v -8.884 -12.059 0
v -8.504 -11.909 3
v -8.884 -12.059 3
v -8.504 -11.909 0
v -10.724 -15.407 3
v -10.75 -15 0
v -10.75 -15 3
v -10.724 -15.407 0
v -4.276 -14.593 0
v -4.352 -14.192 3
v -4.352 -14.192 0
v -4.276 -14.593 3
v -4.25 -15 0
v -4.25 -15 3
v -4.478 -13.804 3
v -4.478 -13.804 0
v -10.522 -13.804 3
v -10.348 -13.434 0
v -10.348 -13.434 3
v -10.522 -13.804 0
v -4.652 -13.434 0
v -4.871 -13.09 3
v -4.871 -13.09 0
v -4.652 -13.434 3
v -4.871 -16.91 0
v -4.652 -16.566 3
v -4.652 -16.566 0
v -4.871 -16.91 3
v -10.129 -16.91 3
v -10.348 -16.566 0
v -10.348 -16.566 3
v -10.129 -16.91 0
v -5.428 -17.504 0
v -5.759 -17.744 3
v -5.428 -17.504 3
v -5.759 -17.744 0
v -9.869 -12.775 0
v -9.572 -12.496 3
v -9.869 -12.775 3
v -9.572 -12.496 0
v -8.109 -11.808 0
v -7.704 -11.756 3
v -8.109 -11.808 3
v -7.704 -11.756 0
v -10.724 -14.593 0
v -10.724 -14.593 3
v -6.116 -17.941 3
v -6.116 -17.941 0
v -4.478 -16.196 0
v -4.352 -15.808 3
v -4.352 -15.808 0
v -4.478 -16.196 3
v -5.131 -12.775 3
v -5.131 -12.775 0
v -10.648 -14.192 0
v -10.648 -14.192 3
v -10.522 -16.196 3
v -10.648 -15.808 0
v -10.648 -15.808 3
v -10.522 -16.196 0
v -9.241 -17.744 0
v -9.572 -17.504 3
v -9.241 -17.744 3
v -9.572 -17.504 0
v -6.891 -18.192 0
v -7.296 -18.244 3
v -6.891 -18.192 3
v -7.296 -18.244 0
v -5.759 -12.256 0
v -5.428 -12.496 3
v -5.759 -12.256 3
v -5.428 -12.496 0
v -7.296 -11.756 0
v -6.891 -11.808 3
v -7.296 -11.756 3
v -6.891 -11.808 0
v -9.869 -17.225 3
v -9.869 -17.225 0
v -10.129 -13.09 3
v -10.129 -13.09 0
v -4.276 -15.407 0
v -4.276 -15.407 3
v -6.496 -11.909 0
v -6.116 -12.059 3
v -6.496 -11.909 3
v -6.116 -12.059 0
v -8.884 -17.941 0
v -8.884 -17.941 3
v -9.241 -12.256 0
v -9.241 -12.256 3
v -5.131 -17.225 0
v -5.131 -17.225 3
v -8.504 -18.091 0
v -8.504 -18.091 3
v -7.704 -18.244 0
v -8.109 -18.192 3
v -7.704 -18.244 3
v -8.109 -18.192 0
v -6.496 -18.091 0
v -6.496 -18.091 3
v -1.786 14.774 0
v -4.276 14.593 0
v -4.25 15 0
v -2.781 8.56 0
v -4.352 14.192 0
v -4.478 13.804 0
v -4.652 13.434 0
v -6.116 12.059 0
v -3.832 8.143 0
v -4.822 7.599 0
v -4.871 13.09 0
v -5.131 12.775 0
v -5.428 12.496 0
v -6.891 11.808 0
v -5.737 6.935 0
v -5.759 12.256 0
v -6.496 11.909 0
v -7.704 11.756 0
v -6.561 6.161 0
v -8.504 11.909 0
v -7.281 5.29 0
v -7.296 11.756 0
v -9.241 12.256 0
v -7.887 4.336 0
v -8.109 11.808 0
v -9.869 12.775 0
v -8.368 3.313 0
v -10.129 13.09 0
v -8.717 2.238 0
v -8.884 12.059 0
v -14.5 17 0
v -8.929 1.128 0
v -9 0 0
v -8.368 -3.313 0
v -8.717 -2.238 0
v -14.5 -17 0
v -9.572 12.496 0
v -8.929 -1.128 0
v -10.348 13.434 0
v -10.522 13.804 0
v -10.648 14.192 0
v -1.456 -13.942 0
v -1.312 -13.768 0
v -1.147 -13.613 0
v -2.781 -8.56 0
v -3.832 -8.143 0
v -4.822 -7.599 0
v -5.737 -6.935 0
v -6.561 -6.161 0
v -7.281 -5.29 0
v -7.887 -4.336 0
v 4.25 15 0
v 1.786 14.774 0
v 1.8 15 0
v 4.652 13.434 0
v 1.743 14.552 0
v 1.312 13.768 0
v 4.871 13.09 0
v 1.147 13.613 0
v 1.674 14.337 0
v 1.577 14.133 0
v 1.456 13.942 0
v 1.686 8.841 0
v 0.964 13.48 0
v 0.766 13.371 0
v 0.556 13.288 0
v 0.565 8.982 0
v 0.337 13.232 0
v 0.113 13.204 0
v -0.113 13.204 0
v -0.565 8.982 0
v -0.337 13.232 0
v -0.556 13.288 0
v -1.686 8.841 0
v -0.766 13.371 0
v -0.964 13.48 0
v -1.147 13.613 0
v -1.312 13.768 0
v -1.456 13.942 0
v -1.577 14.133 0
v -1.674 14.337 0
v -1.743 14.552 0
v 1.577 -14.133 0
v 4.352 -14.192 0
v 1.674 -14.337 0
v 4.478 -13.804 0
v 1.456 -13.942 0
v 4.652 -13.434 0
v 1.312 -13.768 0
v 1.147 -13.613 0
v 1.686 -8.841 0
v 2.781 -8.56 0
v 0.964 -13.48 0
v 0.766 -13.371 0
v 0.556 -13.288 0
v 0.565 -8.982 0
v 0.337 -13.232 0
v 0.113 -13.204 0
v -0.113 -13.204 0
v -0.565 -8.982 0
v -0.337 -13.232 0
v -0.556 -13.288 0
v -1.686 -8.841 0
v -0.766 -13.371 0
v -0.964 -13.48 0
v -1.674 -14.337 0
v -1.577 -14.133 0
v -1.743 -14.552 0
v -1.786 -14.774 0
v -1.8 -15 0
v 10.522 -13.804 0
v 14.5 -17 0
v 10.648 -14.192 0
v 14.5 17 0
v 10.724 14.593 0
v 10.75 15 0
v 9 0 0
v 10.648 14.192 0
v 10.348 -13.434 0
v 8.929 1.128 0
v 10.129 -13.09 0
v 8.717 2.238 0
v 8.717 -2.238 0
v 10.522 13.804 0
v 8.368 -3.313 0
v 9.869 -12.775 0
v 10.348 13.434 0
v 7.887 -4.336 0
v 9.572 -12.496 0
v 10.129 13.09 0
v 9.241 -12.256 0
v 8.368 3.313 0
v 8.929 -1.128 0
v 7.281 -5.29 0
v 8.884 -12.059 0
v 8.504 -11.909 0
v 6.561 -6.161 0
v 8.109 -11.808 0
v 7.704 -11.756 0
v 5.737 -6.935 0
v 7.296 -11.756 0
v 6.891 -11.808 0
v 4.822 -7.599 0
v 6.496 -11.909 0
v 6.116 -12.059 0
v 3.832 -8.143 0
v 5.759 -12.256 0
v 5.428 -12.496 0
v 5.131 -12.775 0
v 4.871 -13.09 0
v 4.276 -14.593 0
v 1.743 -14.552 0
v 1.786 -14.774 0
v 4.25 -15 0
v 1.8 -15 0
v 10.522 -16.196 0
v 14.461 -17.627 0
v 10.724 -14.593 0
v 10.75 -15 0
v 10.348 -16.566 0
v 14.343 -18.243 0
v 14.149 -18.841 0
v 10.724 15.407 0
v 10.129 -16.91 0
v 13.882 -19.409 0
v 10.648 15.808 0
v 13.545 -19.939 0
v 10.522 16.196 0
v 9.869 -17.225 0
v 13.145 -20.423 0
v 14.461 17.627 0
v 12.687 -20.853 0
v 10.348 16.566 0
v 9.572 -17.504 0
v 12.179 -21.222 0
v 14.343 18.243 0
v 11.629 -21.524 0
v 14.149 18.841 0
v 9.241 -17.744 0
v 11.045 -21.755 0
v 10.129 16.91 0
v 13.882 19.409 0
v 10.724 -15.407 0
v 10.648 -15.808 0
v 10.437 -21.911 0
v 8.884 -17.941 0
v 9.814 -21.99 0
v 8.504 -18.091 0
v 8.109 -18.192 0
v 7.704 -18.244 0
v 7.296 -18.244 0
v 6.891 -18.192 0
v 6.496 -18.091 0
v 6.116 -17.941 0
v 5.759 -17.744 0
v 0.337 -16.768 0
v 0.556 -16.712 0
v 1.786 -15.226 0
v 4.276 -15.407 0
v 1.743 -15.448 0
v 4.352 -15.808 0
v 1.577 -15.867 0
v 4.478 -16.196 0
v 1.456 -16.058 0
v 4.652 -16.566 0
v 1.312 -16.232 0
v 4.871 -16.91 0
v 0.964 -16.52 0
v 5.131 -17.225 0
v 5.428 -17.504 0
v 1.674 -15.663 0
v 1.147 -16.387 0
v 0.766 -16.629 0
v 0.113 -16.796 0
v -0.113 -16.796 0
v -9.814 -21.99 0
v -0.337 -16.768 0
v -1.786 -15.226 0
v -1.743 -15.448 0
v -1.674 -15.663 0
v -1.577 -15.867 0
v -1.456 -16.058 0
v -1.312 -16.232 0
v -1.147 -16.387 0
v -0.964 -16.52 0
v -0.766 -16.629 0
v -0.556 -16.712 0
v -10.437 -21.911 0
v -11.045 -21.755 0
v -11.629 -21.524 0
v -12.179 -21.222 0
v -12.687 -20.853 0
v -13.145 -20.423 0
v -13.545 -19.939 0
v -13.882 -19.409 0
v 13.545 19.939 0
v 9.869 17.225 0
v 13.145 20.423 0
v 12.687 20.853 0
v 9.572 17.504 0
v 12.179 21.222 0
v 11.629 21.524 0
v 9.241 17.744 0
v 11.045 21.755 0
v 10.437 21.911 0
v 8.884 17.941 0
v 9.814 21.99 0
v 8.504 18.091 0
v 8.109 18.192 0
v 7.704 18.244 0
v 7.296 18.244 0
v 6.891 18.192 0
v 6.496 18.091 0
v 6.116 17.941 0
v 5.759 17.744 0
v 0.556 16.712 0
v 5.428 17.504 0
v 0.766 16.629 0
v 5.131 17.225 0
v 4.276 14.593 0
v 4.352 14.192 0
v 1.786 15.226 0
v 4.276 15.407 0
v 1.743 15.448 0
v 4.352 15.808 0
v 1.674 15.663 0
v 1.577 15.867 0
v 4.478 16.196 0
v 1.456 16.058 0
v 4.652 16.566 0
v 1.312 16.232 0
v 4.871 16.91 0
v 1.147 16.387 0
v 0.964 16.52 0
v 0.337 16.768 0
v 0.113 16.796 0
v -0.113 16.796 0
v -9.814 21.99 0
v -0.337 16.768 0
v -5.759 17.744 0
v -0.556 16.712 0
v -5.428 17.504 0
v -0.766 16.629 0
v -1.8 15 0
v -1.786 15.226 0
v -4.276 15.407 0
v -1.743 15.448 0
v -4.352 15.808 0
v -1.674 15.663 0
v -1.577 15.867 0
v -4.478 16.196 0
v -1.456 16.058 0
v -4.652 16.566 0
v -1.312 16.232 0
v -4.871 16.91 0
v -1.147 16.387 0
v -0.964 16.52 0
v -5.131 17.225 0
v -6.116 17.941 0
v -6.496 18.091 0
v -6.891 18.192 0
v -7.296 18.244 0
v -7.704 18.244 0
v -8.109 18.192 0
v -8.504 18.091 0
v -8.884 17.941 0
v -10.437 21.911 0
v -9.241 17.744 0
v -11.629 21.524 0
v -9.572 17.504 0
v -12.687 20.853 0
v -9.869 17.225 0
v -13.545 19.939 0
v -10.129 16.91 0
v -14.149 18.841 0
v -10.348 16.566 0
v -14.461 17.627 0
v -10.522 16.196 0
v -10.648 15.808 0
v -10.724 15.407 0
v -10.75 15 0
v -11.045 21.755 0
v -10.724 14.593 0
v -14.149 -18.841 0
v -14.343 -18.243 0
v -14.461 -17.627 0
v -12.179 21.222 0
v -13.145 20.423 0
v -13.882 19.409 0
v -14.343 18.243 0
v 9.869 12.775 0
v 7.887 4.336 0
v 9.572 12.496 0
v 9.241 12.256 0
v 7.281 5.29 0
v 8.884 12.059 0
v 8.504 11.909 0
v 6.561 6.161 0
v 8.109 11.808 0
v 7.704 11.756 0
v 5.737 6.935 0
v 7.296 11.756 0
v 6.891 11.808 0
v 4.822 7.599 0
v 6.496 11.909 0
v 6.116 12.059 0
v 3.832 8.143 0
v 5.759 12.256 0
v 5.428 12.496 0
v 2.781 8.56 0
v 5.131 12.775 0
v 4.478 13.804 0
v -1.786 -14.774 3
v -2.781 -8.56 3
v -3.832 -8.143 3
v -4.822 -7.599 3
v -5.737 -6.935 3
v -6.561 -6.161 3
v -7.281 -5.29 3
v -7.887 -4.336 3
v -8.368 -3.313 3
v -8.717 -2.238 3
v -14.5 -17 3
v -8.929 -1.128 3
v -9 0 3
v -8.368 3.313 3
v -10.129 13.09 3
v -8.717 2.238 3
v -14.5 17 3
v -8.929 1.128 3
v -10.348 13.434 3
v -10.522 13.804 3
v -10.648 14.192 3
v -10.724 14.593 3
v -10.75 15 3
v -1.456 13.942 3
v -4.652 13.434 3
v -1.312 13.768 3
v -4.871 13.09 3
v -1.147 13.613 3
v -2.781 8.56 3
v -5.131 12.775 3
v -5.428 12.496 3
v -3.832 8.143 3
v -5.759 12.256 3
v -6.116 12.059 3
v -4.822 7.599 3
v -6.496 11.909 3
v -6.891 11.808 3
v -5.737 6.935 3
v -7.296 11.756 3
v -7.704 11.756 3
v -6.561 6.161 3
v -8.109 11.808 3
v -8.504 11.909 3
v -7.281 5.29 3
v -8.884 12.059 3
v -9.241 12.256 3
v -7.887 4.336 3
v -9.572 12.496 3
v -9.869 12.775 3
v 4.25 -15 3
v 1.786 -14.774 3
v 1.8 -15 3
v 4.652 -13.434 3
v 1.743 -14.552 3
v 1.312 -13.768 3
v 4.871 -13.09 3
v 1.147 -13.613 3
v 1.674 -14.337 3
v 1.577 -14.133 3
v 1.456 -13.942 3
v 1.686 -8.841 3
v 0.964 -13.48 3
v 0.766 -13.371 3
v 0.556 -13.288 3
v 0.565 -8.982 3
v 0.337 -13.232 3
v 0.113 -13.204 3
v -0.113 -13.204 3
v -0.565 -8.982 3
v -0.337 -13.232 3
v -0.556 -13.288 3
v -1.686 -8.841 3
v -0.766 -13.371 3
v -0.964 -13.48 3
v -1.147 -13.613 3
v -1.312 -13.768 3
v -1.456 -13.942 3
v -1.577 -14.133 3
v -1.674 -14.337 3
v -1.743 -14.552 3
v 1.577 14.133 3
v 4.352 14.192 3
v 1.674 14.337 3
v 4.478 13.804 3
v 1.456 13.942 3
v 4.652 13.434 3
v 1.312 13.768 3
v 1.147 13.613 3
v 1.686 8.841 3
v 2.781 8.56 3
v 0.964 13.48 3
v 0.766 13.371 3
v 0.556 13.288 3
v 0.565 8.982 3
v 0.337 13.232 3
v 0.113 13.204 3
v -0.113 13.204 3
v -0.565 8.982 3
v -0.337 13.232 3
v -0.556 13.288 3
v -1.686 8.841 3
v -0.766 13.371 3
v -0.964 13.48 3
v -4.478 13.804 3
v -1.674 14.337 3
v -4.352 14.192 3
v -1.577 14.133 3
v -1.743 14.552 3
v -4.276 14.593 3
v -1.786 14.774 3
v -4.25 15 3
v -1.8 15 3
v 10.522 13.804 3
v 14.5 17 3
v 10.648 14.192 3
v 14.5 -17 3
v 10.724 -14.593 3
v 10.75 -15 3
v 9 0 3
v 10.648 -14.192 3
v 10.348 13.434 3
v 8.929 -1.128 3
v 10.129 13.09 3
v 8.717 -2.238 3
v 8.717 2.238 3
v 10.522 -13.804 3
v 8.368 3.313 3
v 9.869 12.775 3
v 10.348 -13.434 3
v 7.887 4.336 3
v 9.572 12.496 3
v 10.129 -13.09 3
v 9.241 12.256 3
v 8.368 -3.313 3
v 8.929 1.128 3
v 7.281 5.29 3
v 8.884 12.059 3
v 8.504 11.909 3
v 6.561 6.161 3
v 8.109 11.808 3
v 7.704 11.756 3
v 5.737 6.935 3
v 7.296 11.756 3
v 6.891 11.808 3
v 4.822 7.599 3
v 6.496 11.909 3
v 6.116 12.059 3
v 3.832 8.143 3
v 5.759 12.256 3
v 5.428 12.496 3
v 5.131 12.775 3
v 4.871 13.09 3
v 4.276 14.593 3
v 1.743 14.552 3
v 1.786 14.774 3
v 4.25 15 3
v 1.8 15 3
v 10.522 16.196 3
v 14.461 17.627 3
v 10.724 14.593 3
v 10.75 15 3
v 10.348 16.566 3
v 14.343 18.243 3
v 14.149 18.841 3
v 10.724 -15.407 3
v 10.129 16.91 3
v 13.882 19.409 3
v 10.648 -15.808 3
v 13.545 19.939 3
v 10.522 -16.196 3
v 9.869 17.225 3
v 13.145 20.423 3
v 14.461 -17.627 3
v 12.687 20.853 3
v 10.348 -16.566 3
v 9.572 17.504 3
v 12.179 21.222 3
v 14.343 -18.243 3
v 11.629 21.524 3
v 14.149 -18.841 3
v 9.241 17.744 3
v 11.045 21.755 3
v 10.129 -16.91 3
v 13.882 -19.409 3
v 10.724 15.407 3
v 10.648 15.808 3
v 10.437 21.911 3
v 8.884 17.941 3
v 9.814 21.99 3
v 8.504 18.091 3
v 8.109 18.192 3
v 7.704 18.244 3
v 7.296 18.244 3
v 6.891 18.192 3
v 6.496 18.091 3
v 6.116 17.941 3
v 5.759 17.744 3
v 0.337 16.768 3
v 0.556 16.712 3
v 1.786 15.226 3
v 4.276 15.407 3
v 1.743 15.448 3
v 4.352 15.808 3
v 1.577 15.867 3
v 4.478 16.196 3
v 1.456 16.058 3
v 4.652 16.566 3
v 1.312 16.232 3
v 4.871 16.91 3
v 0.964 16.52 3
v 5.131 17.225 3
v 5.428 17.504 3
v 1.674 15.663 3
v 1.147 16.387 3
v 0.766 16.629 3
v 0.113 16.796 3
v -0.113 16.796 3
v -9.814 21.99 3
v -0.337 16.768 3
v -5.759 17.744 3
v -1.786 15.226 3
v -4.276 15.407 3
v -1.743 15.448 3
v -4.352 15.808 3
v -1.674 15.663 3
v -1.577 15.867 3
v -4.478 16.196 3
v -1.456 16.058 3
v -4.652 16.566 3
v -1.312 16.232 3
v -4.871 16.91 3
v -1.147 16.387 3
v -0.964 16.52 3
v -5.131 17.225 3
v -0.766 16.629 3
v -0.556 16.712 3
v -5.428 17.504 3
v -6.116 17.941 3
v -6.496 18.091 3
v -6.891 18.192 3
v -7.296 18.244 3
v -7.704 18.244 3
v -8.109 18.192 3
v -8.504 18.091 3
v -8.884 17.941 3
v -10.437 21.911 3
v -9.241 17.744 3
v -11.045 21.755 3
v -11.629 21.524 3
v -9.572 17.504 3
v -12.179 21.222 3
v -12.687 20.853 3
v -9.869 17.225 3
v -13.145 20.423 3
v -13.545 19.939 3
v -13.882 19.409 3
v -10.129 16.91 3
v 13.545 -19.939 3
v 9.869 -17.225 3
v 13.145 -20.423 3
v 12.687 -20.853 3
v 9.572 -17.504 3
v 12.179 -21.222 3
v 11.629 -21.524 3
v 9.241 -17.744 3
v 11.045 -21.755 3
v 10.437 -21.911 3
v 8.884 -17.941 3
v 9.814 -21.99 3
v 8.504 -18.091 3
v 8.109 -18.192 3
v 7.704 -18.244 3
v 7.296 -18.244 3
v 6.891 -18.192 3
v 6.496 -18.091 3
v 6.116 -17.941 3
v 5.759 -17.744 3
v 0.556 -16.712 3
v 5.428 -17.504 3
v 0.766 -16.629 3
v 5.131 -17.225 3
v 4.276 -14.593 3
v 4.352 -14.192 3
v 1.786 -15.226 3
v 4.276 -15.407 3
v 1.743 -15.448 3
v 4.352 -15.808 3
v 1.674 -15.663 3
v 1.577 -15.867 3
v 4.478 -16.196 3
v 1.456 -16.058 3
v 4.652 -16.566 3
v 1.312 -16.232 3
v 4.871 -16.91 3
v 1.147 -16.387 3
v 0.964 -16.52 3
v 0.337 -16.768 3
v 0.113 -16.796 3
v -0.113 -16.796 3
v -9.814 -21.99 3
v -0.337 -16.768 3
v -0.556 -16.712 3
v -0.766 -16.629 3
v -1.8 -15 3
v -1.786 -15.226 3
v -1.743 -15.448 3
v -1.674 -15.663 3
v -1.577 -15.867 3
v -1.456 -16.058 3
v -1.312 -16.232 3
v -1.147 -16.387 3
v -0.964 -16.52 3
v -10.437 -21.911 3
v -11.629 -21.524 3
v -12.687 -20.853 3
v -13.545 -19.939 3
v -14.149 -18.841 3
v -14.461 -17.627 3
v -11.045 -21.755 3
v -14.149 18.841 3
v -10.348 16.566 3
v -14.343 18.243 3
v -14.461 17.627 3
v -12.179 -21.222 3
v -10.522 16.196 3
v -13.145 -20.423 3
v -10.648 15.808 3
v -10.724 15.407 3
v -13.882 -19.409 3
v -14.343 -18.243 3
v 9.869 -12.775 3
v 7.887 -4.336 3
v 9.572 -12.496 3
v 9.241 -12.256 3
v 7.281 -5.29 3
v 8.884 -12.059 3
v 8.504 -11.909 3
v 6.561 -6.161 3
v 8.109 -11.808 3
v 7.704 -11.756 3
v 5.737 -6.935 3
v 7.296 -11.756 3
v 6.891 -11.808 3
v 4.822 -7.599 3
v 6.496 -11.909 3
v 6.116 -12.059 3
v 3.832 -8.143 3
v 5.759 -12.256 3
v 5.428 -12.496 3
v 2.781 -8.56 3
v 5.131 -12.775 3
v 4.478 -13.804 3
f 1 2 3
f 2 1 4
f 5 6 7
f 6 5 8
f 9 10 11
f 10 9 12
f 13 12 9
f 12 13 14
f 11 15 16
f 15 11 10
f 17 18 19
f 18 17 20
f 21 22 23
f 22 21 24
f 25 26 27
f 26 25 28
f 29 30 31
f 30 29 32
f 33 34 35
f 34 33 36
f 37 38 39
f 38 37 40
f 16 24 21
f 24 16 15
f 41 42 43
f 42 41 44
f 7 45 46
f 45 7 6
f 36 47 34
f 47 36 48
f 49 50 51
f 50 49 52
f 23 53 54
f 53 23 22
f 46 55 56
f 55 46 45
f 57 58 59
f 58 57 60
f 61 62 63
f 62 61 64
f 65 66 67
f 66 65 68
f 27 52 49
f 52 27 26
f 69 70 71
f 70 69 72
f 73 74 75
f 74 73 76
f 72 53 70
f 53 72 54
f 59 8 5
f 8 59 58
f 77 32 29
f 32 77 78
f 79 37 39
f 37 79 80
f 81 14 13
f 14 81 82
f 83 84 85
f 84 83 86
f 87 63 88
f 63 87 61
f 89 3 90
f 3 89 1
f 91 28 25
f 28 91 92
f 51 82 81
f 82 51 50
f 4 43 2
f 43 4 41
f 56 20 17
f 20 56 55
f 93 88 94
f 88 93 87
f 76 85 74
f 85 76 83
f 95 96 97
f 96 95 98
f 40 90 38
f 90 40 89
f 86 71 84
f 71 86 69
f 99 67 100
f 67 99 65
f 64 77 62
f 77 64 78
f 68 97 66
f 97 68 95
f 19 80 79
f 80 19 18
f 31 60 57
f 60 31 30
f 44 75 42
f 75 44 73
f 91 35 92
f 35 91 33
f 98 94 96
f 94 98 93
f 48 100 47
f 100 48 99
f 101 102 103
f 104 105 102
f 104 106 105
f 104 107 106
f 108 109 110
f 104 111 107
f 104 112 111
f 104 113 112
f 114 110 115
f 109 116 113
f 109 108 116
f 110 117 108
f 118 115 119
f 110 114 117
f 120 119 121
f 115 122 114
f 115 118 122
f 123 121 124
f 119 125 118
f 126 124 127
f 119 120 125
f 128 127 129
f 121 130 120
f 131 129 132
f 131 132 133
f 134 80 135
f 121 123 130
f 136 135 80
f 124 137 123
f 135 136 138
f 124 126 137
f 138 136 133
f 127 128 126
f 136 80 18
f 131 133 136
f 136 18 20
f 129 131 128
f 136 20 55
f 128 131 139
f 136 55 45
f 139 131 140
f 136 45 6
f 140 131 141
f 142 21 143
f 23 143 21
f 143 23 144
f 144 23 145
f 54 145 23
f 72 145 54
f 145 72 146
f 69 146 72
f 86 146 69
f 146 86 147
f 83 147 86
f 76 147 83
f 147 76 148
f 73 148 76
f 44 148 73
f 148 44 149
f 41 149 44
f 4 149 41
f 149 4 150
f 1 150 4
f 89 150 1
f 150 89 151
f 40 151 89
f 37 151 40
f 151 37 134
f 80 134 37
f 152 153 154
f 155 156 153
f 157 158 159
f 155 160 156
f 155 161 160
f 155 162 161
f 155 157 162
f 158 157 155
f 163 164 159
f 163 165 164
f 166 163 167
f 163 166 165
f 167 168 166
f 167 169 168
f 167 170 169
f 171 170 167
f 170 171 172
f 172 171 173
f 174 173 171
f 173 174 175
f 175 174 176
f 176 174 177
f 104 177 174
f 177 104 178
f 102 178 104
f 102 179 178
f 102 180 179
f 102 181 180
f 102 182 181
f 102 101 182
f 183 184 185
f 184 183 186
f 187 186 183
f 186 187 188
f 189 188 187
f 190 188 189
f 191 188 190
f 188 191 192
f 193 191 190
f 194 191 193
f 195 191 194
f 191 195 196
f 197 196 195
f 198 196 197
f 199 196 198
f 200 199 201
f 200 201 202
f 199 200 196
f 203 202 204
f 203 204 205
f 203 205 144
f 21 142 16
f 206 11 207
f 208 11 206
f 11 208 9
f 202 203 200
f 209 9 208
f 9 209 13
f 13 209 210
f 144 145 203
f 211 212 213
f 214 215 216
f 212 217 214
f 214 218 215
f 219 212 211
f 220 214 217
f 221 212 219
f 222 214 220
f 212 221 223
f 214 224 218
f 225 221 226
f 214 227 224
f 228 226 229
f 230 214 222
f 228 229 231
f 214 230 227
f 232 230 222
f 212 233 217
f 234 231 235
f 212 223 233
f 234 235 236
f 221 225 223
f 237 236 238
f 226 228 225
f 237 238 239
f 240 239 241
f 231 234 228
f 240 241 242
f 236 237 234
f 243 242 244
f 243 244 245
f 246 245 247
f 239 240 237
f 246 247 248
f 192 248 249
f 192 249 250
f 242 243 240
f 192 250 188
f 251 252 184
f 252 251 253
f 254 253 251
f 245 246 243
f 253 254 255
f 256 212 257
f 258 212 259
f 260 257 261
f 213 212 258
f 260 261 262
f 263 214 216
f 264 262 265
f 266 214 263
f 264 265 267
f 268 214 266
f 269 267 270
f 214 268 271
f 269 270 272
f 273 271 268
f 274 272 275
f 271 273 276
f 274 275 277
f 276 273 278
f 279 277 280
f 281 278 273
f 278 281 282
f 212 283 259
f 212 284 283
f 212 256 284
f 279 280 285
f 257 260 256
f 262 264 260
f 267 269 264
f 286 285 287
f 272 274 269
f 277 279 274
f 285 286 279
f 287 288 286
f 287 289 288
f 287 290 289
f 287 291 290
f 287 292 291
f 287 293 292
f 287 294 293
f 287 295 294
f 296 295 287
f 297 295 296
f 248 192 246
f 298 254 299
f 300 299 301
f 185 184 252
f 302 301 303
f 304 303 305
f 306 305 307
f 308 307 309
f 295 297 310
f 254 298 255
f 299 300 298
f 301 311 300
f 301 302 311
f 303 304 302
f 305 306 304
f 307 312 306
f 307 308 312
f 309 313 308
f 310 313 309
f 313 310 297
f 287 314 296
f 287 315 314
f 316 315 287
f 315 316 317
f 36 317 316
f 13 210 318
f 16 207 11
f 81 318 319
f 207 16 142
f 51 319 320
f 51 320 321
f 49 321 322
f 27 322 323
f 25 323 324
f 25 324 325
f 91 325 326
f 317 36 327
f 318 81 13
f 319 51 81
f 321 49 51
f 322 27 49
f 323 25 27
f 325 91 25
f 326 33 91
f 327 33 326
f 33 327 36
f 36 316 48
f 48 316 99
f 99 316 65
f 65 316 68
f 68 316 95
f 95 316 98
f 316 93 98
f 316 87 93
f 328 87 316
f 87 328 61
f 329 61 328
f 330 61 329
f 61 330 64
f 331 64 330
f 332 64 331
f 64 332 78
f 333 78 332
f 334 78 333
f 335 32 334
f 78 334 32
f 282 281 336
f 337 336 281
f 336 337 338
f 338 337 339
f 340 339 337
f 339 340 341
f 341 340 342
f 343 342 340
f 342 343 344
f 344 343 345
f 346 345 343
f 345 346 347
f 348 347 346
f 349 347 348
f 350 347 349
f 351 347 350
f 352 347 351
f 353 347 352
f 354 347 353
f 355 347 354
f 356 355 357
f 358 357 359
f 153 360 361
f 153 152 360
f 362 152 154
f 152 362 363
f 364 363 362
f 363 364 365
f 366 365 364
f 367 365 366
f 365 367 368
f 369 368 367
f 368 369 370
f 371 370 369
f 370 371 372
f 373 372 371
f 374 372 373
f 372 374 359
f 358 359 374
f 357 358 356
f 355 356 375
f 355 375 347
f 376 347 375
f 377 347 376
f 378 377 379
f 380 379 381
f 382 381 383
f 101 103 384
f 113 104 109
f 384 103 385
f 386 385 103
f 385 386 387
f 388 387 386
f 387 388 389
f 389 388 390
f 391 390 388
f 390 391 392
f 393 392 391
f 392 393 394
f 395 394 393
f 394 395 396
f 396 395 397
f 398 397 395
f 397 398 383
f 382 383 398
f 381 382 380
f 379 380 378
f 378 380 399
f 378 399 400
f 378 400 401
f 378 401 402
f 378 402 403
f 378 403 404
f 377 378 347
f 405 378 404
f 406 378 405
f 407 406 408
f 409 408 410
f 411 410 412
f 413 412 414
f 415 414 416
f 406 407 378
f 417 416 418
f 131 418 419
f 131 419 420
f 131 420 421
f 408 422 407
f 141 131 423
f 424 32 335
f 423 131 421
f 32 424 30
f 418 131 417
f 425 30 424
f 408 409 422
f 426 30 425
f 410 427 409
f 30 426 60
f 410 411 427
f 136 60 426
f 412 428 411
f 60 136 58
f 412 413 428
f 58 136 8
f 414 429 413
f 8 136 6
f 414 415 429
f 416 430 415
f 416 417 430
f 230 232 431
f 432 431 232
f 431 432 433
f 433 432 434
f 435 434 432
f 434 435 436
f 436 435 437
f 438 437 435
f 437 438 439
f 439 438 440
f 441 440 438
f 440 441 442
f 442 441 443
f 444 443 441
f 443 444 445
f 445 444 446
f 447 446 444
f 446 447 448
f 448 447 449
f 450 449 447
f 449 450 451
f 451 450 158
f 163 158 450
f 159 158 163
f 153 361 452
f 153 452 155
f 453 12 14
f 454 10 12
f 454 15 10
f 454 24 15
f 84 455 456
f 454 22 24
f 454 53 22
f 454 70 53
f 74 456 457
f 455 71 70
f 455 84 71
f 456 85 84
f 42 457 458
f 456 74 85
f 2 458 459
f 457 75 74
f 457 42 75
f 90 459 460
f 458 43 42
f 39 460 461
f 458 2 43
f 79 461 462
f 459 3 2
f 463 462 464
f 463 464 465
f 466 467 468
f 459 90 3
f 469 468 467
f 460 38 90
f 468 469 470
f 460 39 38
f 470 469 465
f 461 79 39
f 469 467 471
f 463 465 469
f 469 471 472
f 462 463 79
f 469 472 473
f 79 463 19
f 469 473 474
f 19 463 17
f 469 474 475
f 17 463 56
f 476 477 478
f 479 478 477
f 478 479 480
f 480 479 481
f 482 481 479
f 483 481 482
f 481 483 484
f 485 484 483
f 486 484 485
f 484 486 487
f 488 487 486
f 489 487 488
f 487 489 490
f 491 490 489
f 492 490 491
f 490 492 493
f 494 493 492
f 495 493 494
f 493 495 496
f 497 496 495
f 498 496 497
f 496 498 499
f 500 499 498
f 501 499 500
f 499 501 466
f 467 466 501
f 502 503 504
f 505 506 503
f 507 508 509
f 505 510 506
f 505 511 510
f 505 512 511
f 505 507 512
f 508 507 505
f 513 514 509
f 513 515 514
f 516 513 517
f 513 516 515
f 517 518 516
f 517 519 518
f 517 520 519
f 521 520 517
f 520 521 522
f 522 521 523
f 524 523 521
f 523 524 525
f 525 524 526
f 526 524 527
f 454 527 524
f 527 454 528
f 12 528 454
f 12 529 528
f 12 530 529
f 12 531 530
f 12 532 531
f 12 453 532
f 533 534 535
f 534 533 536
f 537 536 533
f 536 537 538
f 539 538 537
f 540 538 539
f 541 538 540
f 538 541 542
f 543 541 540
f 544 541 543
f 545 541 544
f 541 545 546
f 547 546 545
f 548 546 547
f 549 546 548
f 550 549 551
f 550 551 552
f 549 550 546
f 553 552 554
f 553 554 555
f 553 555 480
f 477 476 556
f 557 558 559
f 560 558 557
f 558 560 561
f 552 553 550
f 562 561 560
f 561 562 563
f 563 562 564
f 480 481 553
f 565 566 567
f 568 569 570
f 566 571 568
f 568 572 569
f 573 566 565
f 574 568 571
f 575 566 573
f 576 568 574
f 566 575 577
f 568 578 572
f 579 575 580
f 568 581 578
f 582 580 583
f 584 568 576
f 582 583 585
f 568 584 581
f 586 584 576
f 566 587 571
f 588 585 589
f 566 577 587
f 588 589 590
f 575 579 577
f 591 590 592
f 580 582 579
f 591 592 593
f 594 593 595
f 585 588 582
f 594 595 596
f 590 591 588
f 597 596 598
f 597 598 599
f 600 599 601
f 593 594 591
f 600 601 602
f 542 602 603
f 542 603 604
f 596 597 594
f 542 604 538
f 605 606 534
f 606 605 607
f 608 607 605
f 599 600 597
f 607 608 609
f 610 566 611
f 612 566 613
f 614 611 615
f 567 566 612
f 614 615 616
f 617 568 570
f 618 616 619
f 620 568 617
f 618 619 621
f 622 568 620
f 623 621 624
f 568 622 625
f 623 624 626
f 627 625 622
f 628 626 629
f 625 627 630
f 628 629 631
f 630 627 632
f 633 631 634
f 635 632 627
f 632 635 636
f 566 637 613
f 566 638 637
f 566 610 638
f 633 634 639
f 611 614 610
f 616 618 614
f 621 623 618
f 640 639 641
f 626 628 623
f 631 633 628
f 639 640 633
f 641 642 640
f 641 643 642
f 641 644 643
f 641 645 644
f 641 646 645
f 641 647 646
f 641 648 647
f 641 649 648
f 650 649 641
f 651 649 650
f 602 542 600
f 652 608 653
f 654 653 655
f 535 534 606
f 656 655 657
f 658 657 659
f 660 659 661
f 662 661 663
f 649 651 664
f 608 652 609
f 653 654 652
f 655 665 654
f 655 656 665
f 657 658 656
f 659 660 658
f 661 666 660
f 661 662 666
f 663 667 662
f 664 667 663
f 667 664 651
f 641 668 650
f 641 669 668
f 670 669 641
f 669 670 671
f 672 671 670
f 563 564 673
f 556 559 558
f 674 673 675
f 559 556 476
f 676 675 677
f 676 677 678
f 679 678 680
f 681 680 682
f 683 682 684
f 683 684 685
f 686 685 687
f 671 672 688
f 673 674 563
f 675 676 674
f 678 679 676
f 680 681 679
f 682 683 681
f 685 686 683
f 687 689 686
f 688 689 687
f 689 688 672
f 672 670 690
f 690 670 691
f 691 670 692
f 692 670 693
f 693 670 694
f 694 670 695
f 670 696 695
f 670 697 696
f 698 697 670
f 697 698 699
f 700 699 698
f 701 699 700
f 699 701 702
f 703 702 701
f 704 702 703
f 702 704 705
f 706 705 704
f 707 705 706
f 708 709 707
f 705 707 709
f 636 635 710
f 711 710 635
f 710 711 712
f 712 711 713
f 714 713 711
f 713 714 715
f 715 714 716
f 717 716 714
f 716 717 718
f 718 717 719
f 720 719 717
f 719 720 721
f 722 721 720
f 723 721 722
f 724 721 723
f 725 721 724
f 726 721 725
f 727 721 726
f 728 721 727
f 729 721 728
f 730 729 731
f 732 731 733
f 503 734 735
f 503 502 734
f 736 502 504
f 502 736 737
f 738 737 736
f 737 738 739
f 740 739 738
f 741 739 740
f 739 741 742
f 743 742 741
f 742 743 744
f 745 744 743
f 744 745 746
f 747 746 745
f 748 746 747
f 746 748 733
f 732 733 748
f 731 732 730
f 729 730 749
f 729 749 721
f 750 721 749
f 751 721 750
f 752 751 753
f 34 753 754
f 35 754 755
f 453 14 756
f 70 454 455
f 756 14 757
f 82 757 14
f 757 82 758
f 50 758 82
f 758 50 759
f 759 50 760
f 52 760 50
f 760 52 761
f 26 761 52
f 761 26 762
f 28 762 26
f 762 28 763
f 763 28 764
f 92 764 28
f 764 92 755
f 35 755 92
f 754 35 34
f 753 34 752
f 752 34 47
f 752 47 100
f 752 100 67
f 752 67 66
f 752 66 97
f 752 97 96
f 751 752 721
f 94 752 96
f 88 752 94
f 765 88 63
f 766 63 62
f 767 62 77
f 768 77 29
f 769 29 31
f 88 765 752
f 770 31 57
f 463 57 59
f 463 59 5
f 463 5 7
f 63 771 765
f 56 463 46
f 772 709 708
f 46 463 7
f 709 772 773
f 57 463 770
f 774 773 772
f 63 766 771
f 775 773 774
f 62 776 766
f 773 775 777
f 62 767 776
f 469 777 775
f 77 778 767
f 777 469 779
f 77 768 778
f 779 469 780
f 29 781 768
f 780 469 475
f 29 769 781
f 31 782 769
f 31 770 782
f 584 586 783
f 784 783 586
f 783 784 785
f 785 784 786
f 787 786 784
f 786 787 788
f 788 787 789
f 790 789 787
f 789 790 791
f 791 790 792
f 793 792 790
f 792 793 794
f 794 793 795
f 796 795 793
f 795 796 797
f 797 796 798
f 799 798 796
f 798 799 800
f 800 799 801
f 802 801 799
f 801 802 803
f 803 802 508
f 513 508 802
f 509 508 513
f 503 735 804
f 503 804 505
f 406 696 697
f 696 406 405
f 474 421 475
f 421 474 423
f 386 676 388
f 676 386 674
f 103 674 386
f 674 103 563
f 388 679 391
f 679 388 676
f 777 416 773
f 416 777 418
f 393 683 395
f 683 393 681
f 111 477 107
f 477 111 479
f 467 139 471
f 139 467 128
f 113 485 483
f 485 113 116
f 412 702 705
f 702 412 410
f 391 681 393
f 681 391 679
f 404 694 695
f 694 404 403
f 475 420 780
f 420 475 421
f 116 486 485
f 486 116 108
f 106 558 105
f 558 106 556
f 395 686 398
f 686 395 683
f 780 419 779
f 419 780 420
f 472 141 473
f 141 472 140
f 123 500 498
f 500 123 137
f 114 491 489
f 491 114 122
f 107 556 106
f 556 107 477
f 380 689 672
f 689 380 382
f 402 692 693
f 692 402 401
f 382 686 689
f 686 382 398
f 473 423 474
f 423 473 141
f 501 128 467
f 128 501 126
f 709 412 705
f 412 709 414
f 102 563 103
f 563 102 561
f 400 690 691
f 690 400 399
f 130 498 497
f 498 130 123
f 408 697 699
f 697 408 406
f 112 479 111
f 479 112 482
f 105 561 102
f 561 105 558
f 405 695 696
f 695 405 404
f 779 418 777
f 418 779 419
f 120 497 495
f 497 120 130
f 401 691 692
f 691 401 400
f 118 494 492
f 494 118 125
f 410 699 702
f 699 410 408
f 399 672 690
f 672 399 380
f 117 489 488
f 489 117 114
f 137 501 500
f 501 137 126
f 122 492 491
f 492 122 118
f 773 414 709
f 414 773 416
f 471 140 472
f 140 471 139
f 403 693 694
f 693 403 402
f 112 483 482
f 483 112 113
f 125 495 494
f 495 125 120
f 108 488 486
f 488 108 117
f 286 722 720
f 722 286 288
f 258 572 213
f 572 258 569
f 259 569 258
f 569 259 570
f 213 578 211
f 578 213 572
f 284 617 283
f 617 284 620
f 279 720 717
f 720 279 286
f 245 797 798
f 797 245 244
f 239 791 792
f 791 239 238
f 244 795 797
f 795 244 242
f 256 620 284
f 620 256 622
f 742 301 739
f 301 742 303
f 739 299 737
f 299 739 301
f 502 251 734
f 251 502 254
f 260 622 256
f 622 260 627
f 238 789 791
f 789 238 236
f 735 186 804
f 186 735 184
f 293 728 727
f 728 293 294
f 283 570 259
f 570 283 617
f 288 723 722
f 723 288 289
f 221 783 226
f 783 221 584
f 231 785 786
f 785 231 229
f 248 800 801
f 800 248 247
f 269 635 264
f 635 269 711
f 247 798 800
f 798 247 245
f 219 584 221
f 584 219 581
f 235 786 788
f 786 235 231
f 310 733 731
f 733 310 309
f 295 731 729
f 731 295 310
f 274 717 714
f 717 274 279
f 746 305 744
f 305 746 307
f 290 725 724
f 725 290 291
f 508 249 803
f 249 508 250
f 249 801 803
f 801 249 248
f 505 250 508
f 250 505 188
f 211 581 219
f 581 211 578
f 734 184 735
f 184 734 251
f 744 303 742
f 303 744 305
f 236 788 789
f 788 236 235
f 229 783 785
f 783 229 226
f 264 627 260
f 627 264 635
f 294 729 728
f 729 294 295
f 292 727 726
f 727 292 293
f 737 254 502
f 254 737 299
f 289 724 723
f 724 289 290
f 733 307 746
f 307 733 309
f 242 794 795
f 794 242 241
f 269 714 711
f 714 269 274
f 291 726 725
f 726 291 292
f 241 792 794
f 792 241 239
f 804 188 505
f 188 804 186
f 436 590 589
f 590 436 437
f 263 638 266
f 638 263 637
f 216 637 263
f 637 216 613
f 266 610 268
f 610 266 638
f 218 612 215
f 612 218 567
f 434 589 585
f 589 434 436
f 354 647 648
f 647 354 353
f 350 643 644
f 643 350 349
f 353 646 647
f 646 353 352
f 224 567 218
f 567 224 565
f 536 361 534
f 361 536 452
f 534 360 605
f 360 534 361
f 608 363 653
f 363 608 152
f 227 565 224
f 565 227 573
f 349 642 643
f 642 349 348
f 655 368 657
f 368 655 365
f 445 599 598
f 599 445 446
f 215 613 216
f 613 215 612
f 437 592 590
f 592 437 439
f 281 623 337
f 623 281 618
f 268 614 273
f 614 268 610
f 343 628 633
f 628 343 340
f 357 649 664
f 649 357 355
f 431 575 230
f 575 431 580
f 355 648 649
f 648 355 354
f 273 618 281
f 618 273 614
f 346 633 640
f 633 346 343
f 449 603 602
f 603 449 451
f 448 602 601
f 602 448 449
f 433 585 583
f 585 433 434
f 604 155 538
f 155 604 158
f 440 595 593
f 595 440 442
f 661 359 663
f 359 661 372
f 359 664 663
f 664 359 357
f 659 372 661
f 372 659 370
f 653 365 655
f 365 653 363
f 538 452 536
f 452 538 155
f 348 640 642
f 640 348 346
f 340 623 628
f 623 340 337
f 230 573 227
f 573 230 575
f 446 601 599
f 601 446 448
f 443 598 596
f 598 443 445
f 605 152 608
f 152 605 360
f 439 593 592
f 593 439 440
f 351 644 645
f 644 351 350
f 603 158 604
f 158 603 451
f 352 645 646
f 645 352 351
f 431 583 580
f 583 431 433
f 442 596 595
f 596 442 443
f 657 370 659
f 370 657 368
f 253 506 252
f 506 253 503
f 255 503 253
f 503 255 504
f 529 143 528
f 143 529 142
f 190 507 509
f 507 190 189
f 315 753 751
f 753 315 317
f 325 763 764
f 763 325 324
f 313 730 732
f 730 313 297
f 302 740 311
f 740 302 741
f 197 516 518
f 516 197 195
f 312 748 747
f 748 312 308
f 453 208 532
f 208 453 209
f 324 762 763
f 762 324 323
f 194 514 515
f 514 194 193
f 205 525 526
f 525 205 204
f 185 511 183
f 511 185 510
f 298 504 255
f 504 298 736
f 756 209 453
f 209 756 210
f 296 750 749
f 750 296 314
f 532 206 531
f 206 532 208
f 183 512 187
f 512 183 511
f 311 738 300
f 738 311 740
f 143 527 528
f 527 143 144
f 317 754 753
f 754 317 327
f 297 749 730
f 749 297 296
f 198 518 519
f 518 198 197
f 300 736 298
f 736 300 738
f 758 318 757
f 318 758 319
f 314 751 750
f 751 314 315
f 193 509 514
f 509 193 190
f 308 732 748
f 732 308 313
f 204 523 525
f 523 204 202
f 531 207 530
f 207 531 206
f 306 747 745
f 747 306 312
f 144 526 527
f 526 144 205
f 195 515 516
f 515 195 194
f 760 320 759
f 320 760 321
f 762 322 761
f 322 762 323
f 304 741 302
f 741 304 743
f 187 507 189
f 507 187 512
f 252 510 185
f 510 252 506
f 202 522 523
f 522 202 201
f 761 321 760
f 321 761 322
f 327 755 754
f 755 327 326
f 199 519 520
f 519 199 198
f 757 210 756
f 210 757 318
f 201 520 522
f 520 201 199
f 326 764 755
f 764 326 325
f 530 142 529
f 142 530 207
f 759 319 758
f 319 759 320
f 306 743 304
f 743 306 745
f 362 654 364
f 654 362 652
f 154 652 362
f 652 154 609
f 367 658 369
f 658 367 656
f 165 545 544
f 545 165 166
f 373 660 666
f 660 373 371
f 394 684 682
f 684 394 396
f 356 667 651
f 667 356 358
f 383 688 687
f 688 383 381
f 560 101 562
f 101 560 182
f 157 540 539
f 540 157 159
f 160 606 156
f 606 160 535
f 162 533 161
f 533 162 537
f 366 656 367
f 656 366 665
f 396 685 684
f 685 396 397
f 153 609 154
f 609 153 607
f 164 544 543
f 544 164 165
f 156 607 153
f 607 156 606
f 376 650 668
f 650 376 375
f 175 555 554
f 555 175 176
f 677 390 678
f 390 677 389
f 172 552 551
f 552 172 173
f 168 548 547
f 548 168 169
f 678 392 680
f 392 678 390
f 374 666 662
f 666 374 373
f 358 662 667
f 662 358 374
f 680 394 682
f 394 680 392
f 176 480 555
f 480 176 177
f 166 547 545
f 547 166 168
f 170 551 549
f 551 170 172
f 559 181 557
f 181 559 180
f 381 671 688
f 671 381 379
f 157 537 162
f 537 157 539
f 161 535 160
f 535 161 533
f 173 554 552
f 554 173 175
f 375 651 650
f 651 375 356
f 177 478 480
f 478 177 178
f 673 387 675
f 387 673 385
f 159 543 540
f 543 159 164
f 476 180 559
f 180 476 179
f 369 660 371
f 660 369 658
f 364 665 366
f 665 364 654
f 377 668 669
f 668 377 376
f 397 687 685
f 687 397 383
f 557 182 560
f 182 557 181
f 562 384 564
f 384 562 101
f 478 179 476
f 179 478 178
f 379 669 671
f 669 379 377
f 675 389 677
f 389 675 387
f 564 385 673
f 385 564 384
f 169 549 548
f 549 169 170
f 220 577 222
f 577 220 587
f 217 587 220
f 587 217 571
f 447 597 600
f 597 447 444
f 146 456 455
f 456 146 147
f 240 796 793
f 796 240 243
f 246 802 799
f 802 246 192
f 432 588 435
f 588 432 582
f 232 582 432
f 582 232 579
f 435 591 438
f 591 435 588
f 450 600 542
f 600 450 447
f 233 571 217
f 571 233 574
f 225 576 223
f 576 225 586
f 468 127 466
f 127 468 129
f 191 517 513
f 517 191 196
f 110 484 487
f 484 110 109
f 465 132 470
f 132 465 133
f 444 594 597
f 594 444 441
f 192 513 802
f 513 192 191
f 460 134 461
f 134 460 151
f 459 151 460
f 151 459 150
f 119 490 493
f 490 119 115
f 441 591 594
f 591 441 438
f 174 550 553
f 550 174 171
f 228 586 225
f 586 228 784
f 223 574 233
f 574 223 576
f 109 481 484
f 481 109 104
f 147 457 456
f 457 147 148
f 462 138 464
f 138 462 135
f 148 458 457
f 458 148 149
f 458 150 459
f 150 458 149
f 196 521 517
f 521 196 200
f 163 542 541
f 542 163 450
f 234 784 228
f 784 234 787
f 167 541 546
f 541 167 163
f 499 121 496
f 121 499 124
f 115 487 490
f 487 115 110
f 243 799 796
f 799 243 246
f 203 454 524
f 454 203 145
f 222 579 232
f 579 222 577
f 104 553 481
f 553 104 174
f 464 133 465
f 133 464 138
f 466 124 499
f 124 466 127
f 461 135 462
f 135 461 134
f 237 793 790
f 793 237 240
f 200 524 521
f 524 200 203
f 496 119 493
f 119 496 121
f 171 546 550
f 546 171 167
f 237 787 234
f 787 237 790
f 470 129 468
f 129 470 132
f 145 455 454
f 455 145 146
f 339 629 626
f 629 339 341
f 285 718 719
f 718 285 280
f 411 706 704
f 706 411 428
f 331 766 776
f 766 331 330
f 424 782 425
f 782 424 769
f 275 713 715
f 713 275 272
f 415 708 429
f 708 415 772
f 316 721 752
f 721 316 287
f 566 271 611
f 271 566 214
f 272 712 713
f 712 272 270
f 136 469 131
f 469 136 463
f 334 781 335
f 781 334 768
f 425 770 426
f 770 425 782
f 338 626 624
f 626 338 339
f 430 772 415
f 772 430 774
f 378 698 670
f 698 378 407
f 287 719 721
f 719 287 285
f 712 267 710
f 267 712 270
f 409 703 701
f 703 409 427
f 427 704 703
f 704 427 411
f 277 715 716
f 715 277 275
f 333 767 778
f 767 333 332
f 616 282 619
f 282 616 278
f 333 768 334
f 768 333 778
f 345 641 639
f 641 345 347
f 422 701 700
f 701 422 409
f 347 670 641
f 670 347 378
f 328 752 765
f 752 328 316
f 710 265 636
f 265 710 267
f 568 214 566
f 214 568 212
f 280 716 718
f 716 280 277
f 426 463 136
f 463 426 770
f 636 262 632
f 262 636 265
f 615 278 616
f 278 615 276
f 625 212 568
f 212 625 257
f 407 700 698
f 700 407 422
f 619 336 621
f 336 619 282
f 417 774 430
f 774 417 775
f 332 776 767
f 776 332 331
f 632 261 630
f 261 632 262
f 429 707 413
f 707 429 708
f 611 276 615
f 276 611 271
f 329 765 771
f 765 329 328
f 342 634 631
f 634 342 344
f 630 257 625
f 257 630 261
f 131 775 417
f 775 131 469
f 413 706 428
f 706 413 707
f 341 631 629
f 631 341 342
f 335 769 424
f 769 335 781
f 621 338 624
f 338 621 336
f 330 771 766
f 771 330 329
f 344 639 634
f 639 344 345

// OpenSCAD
$fn = 50;

difference() {
	union() {
		hull() {
			translate(v = [-9.5, 17.0, 0]) {
				cylinder(h = 3, r = 5);
			}
			translate(v = [9.5, 17.0, 0]) {
				cylinder(h = 3, r = 5);
			}
			translate(v = [-9.5, -17.0, 0]) {
				cylinder(h = 3, r = 5);
			}
			translate(v = [9.5, -17.0, 0]) {
				cylinder(h = 3, r = 5);
			}
		}
	}
	union() {
		translate(v = [-7.5, -15.0, 0]) {
			cylinder(h = 3, r = 3.25);
		}
		translate(v = [-7.5, 15.0, 0]) {
			cylinder(h = 3, r = 3.25);
		}
		translate(v = [7.5, -15.0, 0]) {
			cylinder(h = 3, r = 3.25);
		}
		translate(v = [7.5, 15.0, 0]) {
			cylinder(h = 3, r = 3.25);
		}
		translate(v = [0.0, -15.0, 0]) {
			cylinder(h = 3, r = 1.8);
		}
		translate(v = [0.0, 15.0, 0]) {
			cylinder(h = 3, r = 1.8);
		}
		cylinder(h = 3, r = 9.0);
	}
}
